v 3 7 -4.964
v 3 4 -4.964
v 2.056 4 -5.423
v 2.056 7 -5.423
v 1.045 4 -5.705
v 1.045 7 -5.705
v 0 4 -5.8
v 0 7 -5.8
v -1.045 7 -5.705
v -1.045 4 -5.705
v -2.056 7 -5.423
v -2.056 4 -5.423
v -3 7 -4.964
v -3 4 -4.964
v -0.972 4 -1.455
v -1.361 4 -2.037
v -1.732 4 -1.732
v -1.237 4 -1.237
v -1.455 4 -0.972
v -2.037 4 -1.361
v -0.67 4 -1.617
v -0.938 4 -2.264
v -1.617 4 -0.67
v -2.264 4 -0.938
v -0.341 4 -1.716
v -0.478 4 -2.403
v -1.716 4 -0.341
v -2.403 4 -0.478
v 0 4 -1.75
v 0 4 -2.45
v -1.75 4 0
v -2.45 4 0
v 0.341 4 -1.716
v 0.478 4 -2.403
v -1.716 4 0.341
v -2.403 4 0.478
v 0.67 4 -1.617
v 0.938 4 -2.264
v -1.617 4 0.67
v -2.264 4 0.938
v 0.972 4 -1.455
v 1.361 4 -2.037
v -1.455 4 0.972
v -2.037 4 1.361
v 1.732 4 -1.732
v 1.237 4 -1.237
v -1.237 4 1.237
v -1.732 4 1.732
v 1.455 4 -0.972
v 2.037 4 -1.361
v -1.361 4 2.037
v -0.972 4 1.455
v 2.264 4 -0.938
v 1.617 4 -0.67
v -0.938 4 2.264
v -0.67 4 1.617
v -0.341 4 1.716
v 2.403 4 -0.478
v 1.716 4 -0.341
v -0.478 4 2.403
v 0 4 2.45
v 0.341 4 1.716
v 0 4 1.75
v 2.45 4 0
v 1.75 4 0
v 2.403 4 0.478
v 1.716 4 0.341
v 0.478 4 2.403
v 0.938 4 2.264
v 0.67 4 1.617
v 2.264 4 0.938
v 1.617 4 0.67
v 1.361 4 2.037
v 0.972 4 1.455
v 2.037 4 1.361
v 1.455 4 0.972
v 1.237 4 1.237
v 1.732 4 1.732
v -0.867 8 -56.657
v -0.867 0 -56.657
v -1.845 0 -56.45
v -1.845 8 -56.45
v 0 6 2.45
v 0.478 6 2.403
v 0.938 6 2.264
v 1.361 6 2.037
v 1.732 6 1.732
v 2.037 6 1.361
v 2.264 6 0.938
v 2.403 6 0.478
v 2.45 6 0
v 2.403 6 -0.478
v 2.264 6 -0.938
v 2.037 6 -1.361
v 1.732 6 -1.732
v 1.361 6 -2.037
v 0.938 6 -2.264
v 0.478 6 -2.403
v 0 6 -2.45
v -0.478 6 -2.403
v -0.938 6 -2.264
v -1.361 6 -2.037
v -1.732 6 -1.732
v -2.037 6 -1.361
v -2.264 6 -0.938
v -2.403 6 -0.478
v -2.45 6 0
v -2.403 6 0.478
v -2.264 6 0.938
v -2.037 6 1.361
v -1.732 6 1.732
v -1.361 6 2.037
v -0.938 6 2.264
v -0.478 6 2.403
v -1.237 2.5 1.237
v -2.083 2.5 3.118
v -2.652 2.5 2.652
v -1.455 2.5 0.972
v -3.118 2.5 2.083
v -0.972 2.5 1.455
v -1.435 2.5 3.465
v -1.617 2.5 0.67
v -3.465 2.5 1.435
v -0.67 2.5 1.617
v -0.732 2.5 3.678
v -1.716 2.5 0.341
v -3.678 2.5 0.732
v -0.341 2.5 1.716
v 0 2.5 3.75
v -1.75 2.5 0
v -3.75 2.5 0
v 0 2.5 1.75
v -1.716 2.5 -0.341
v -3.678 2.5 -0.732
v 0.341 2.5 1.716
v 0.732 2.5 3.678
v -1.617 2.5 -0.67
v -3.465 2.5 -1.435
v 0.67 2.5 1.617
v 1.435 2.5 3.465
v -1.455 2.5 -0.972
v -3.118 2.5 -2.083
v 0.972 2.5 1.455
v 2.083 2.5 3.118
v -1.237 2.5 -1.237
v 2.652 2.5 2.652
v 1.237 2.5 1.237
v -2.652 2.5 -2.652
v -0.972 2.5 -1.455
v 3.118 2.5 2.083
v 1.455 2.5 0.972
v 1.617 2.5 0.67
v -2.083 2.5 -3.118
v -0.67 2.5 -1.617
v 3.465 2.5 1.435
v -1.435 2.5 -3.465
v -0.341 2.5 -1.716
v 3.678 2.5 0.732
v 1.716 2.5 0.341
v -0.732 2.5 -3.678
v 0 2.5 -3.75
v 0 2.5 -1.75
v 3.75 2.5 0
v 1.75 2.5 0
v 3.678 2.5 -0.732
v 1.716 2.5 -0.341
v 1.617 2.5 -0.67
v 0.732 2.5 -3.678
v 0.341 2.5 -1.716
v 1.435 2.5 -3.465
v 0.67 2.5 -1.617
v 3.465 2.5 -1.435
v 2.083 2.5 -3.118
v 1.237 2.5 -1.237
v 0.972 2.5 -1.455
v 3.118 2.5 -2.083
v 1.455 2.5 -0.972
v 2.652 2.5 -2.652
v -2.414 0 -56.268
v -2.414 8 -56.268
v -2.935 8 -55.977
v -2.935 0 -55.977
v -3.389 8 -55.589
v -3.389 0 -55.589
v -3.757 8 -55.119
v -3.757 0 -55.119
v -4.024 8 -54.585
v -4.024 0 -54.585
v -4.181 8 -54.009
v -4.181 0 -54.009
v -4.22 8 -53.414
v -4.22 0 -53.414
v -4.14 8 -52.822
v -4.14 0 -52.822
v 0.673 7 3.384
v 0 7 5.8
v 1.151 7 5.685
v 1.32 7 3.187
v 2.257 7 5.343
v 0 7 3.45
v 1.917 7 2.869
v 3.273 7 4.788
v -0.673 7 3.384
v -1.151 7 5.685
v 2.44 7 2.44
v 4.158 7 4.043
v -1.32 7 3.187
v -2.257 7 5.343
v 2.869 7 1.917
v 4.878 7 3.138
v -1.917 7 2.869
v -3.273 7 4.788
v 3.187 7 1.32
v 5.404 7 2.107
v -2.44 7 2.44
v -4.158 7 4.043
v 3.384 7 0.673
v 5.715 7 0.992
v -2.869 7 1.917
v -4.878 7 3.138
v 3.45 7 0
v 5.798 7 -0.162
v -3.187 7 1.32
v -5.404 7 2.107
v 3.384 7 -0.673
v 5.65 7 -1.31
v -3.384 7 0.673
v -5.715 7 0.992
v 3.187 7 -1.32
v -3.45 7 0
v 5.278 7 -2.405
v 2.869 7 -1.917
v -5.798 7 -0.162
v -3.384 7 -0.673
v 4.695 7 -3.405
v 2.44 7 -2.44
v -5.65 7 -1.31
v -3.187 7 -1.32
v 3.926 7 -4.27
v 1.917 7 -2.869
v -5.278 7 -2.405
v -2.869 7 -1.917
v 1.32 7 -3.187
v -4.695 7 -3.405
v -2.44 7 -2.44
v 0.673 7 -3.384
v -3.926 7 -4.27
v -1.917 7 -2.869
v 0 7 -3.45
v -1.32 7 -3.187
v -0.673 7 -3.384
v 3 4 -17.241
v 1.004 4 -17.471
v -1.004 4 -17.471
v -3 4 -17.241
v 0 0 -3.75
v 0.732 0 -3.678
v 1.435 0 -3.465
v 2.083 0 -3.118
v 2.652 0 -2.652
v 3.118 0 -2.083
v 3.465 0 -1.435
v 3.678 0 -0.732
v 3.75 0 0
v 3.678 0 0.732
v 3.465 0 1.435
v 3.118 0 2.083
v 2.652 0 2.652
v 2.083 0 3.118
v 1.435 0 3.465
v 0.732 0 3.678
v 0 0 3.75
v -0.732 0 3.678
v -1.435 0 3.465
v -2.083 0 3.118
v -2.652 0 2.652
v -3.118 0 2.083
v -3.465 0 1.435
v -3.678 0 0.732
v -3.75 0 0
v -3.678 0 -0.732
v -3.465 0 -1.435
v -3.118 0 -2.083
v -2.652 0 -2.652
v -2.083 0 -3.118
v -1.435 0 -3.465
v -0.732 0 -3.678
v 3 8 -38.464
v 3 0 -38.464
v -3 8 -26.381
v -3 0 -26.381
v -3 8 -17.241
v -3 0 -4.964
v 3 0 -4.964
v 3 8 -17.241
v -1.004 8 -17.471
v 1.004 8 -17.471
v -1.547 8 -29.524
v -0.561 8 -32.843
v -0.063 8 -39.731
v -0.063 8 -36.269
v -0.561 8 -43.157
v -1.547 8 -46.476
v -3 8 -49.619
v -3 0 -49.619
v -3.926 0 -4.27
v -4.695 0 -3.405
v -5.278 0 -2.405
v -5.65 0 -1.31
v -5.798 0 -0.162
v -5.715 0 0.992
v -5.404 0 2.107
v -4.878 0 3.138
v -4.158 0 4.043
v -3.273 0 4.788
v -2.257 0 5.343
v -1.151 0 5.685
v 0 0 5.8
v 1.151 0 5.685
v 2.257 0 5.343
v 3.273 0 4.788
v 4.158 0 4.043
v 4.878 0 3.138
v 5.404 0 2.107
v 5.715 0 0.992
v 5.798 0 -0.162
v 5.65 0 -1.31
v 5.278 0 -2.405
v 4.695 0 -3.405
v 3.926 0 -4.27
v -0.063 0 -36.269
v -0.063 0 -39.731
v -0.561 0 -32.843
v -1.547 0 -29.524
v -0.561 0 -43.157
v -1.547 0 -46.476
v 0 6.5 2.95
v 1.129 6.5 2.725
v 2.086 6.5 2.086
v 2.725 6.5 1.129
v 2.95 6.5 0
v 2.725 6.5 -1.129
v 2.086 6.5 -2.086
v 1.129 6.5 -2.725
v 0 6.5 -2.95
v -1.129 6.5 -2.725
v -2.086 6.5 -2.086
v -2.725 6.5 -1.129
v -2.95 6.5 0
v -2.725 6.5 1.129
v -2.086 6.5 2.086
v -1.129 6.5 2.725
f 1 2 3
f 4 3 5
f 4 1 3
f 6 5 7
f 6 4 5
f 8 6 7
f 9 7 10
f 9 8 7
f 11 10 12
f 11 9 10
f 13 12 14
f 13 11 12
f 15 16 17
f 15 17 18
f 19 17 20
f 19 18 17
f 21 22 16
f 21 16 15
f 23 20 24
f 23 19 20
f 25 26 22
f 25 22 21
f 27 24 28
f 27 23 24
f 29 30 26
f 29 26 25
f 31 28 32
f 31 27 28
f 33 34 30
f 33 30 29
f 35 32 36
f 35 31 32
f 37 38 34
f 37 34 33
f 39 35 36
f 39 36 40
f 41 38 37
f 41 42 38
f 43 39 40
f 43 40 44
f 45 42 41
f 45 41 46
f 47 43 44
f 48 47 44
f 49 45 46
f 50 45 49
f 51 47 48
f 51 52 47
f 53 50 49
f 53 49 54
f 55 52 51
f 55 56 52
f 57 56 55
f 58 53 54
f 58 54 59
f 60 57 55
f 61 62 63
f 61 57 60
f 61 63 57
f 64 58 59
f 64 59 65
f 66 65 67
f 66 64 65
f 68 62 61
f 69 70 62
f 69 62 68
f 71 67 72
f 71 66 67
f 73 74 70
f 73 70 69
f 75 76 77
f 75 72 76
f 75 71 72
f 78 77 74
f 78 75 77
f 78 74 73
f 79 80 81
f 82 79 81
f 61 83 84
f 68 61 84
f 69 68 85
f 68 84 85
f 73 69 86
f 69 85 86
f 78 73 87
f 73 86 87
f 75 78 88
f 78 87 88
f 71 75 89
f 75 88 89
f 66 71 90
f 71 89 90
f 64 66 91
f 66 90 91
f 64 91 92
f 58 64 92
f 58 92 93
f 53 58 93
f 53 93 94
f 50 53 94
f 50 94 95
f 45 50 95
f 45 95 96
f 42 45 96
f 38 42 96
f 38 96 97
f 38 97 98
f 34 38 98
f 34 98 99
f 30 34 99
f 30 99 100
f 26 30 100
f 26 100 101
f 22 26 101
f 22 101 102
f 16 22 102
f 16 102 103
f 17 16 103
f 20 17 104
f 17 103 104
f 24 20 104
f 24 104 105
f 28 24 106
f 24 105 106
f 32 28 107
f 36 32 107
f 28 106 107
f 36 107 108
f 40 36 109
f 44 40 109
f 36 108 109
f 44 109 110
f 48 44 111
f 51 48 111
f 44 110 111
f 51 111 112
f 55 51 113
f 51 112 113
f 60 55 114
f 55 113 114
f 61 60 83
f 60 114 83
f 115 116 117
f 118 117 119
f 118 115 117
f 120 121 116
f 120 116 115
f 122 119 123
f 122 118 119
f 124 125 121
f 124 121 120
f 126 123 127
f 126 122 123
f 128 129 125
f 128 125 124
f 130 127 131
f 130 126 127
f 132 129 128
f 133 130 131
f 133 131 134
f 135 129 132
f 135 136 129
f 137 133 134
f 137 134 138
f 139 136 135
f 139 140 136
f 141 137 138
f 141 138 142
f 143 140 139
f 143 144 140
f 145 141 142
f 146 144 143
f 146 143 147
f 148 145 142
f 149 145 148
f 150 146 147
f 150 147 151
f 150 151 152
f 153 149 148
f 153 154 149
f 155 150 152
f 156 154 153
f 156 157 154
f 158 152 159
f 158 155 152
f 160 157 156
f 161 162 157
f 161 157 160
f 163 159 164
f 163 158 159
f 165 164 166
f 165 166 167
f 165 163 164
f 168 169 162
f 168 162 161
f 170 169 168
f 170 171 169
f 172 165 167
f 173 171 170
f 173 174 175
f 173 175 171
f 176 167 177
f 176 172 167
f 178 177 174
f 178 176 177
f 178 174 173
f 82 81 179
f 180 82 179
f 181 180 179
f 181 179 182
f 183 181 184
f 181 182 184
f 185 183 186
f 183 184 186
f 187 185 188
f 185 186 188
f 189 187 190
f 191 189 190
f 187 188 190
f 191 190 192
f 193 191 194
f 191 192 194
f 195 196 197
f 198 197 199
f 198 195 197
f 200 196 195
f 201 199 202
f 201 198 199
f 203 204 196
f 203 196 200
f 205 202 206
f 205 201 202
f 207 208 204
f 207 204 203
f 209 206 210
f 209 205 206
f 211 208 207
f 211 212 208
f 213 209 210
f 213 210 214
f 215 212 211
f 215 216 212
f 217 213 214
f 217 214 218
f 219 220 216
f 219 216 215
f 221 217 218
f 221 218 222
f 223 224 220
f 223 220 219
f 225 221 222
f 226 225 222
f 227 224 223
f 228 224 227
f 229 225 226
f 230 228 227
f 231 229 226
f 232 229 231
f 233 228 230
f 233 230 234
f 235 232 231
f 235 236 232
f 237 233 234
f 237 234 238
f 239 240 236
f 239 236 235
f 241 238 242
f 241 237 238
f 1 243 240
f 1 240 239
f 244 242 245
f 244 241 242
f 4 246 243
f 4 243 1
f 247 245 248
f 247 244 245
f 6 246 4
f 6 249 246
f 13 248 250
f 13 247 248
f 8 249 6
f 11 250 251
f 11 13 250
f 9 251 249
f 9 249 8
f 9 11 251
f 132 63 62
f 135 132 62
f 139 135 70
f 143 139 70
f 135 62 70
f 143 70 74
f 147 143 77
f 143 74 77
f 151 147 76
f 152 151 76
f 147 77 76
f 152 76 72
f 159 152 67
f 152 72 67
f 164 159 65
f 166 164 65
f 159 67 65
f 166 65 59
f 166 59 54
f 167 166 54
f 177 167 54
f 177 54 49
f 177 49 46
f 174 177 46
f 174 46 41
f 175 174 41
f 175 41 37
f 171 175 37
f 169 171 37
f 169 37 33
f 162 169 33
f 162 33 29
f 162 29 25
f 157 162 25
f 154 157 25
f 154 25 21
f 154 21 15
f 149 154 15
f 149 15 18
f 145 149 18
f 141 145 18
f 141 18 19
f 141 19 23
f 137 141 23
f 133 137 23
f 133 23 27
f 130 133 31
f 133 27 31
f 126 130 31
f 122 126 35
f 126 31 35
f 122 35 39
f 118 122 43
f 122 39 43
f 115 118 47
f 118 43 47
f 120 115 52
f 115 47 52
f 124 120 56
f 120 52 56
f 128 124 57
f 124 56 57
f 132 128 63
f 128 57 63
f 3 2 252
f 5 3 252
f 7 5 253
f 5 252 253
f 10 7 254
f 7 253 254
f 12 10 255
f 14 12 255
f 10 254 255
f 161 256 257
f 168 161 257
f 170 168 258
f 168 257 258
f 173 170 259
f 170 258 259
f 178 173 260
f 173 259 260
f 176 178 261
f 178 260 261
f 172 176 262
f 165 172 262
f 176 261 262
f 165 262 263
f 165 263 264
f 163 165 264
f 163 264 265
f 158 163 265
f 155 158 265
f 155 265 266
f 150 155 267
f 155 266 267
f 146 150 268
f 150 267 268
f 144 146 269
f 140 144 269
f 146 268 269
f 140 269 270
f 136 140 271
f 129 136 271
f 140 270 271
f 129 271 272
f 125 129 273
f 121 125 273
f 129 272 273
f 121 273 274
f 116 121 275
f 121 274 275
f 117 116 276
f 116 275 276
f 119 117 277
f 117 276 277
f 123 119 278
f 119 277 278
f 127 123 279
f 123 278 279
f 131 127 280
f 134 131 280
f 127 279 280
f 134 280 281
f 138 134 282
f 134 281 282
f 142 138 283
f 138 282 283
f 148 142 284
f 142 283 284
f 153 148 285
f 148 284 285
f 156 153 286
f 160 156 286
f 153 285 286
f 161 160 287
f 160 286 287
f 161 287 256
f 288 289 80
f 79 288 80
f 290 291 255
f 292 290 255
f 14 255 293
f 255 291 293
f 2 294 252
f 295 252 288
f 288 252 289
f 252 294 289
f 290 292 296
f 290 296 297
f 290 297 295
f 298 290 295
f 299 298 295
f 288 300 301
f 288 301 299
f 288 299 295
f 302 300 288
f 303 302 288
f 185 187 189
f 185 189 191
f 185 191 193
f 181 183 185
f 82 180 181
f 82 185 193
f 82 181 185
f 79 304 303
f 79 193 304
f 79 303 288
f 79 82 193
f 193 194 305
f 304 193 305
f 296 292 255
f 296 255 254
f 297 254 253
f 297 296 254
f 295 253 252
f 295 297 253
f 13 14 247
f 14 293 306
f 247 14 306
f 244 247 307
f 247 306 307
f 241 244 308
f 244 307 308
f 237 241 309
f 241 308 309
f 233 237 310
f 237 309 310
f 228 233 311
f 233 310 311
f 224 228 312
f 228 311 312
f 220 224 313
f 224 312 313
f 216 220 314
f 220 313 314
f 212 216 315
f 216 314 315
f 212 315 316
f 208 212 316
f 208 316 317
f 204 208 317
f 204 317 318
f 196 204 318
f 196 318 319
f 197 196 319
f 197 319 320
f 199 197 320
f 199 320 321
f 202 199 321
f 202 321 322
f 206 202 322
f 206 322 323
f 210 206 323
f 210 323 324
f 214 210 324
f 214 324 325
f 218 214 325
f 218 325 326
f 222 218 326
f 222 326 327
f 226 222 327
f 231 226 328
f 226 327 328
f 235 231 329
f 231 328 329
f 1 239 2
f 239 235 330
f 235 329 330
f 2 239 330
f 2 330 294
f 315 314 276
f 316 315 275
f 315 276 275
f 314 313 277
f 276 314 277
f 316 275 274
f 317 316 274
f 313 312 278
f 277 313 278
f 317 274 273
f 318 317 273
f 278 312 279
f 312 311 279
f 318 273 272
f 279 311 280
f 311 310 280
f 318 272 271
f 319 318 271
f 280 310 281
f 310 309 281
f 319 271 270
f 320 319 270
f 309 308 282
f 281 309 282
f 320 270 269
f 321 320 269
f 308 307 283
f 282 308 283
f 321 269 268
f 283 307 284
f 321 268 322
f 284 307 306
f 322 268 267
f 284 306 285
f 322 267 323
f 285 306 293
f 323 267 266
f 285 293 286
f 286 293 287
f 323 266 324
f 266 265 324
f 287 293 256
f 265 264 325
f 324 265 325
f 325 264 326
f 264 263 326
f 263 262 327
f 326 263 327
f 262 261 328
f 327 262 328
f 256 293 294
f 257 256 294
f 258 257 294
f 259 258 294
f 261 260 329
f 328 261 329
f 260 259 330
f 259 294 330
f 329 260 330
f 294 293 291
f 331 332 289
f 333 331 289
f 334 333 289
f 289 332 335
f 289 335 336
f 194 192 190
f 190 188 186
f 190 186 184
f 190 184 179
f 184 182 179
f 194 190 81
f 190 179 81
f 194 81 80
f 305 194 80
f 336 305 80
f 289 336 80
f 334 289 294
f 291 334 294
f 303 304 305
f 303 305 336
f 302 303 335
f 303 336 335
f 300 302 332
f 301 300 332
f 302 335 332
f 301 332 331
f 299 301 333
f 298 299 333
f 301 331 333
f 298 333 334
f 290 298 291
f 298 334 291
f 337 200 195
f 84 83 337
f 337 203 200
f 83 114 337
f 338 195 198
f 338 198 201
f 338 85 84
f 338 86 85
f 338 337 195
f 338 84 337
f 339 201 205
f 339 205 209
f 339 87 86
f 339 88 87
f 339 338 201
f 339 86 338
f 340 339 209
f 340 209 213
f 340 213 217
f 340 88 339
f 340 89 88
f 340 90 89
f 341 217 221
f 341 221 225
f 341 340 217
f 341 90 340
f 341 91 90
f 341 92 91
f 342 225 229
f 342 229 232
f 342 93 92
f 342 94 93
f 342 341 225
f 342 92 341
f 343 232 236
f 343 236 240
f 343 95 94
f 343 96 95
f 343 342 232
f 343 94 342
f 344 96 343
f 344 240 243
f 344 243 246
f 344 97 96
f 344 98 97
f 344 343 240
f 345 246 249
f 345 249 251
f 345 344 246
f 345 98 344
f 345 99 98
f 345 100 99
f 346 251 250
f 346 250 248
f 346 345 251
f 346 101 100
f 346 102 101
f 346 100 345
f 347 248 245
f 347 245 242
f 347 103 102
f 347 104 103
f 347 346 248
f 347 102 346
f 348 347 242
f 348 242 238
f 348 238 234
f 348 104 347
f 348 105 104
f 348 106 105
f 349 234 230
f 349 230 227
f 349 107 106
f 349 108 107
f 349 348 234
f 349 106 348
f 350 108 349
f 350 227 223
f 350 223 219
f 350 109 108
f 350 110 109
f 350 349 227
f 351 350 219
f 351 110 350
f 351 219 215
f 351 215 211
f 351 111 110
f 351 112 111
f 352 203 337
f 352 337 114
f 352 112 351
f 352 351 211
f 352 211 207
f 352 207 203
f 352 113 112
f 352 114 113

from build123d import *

# Parameters (mm, degrees)
BOSS_EXTRU_1_DEPTH      = 8
ESQUISSE2_R             = 2.45
ENL_V_MAT_EXTRU_1_DEPTH = 4
ENL_V_MAT_EXTRU_2_REACH = 59.094
ESQUISSE3_R             = 1.75
ESQUISSE4_R             = 3.75
ENL_V_MAT_EXTRU_3_DEPTH = 2.5
ENL_V_MAT_EXTRU_4_DEPTH = 4
ESQUISSE7_R             = 5.8
ENL_V_MAT_EXTRU_5_DEPTH = 1
CHANFREIN1_SIZE         = 1


with BuildPart() as part:
    # Esquisse1 → Boss.-Extru.1 (new body)
    with BuildSketch(Plane(origin=(0, 0, 0), x_dir=(1, 0, 0), z_dir=(0, 1, 0))):
        with BuildLine():
            Line((-3, 26.381049961), (-3, 4.963869458))
            ThreePointArc((-3, 4.963869458), (0, -5.8), (3, 4.963869458))
            Line((3, 4.963869458), (3, 38.463869458))
            Line((3, 38.463869458), (-0.867157449, 56.657414832))
            Line((-0.867157449, 56.657414832), (-1.84530505, 56.449503141))
            ThreePointArc((-1.84530505, 56.449503141), (-3.756758837, 55.119060789), (-4.140414176, 52.821988519))
            Line((-4.140414176, 52.821988519), (-3, 49.618950039))
            ThreePointArc((-3, 49.618950039), (0, 38), (-3, 26.381049961))
        make_face()
    extrude(amount=BOSS_EXTRU_1_DEPTH)

    # Esquisse2 → Enlèv. mat.-Extru.1 (cut)
    with BuildSketch(Plane(origin=(0, 8, 0), x_dir=(1, 0, 0), z_dir=(0, 1, 0))):
        with Locations(Location((0, 0, 0), (0, 0, 270))):
            Circle(ESQUISSE2_R)
    extrude(amount=-ENL_V_MAT_EXTRU_1_DEPTH, mode=Mode.SUBTRACT)

    # Esquisse3 → Enlèv. mat.-Extru.2 (cut, up to next)
    with BuildSketch(Plane(origin=(0, 4, 0), x_dir=(1, 0, 0), z_dir=(0, 1, 0)), mode=Mode.PRIVATE) as enl_v_mat_extru_2_sk1:
        with Locations(Location((0, 0, 0), (0, 0, 270))):
            Circle(ESQUISSE3_R)
    enl_v_mat_extru_2_tool1 = extrude(enl_v_mat_extru_2_sk1.sketch, amount=-ENL_V_MAT_EXTRU_2_REACH, mode=Mode.PRIVATE) & part.part
    add(enl_v_mat_extru_2_tool1.solids().sort_by_distance((0, 4, 0))[0], mode=Mode.SUBTRACT)

    # Esquisse4 → Enlèv. mat.-Extru.3 (cut)
    with BuildSketch(Plane.XZ):
        with Locations(Location((0, 0, 0), (0, 0, 270))):
            Circle(ESQUISSE4_R)
    extrude(amount=-ENL_V_MAT_EXTRU_3_DEPTH, mode=Mode.SUBTRACT)

    # Esquisse5 → Enlèv. mat.-Extru.4 (cut)
    with BuildSketch(Plane(origin=(0, 8, 0), x_dir=(1, 0, 0), z_dir=(0, 1, 0))):
        with BuildLine():
            Line((-3, 4.963869458), (-3, 17.24093965))
            ThreePointArc((-3, 17.24093965), (0, 17.5), (3, 17.24093965))
            Line((3, 17.24093965), (3, 4.963869458))
            ThreePointArc((3, 4.963869458), (0, 5.8), (-3, 4.963869458))
        make_face()
    extrude(amount=-ENL_V_MAT_EXTRU_4_DEPTH, mode=Mode.SUBTRACT)

    # Esquisse7 → Enlèv. mat.-Extru.5 (cut)
    with BuildSketch(Plane(origin=(0, 8, 0), x_dir=(1, 0, 0), z_dir=(0, 1, 0))):
        with Locations(Location((0, 0, 0), (0, 0, 58.852610078))):
            Circle(ESQUISSE7_R)
    extrude(amount=-ENL_V_MAT_EXTRU_5_DEPTH, mode=Mode.SUBTRACT)

    # Chanfrein1
    chanfrein1_edges = [part.edges().sort_by_distance(p)[0] for p in [
        (0, 7, -2.45),
    ]]
    chamfer(chanfrein1_edges, length=CHANFREIN1_SIZE)


solid = part.part
